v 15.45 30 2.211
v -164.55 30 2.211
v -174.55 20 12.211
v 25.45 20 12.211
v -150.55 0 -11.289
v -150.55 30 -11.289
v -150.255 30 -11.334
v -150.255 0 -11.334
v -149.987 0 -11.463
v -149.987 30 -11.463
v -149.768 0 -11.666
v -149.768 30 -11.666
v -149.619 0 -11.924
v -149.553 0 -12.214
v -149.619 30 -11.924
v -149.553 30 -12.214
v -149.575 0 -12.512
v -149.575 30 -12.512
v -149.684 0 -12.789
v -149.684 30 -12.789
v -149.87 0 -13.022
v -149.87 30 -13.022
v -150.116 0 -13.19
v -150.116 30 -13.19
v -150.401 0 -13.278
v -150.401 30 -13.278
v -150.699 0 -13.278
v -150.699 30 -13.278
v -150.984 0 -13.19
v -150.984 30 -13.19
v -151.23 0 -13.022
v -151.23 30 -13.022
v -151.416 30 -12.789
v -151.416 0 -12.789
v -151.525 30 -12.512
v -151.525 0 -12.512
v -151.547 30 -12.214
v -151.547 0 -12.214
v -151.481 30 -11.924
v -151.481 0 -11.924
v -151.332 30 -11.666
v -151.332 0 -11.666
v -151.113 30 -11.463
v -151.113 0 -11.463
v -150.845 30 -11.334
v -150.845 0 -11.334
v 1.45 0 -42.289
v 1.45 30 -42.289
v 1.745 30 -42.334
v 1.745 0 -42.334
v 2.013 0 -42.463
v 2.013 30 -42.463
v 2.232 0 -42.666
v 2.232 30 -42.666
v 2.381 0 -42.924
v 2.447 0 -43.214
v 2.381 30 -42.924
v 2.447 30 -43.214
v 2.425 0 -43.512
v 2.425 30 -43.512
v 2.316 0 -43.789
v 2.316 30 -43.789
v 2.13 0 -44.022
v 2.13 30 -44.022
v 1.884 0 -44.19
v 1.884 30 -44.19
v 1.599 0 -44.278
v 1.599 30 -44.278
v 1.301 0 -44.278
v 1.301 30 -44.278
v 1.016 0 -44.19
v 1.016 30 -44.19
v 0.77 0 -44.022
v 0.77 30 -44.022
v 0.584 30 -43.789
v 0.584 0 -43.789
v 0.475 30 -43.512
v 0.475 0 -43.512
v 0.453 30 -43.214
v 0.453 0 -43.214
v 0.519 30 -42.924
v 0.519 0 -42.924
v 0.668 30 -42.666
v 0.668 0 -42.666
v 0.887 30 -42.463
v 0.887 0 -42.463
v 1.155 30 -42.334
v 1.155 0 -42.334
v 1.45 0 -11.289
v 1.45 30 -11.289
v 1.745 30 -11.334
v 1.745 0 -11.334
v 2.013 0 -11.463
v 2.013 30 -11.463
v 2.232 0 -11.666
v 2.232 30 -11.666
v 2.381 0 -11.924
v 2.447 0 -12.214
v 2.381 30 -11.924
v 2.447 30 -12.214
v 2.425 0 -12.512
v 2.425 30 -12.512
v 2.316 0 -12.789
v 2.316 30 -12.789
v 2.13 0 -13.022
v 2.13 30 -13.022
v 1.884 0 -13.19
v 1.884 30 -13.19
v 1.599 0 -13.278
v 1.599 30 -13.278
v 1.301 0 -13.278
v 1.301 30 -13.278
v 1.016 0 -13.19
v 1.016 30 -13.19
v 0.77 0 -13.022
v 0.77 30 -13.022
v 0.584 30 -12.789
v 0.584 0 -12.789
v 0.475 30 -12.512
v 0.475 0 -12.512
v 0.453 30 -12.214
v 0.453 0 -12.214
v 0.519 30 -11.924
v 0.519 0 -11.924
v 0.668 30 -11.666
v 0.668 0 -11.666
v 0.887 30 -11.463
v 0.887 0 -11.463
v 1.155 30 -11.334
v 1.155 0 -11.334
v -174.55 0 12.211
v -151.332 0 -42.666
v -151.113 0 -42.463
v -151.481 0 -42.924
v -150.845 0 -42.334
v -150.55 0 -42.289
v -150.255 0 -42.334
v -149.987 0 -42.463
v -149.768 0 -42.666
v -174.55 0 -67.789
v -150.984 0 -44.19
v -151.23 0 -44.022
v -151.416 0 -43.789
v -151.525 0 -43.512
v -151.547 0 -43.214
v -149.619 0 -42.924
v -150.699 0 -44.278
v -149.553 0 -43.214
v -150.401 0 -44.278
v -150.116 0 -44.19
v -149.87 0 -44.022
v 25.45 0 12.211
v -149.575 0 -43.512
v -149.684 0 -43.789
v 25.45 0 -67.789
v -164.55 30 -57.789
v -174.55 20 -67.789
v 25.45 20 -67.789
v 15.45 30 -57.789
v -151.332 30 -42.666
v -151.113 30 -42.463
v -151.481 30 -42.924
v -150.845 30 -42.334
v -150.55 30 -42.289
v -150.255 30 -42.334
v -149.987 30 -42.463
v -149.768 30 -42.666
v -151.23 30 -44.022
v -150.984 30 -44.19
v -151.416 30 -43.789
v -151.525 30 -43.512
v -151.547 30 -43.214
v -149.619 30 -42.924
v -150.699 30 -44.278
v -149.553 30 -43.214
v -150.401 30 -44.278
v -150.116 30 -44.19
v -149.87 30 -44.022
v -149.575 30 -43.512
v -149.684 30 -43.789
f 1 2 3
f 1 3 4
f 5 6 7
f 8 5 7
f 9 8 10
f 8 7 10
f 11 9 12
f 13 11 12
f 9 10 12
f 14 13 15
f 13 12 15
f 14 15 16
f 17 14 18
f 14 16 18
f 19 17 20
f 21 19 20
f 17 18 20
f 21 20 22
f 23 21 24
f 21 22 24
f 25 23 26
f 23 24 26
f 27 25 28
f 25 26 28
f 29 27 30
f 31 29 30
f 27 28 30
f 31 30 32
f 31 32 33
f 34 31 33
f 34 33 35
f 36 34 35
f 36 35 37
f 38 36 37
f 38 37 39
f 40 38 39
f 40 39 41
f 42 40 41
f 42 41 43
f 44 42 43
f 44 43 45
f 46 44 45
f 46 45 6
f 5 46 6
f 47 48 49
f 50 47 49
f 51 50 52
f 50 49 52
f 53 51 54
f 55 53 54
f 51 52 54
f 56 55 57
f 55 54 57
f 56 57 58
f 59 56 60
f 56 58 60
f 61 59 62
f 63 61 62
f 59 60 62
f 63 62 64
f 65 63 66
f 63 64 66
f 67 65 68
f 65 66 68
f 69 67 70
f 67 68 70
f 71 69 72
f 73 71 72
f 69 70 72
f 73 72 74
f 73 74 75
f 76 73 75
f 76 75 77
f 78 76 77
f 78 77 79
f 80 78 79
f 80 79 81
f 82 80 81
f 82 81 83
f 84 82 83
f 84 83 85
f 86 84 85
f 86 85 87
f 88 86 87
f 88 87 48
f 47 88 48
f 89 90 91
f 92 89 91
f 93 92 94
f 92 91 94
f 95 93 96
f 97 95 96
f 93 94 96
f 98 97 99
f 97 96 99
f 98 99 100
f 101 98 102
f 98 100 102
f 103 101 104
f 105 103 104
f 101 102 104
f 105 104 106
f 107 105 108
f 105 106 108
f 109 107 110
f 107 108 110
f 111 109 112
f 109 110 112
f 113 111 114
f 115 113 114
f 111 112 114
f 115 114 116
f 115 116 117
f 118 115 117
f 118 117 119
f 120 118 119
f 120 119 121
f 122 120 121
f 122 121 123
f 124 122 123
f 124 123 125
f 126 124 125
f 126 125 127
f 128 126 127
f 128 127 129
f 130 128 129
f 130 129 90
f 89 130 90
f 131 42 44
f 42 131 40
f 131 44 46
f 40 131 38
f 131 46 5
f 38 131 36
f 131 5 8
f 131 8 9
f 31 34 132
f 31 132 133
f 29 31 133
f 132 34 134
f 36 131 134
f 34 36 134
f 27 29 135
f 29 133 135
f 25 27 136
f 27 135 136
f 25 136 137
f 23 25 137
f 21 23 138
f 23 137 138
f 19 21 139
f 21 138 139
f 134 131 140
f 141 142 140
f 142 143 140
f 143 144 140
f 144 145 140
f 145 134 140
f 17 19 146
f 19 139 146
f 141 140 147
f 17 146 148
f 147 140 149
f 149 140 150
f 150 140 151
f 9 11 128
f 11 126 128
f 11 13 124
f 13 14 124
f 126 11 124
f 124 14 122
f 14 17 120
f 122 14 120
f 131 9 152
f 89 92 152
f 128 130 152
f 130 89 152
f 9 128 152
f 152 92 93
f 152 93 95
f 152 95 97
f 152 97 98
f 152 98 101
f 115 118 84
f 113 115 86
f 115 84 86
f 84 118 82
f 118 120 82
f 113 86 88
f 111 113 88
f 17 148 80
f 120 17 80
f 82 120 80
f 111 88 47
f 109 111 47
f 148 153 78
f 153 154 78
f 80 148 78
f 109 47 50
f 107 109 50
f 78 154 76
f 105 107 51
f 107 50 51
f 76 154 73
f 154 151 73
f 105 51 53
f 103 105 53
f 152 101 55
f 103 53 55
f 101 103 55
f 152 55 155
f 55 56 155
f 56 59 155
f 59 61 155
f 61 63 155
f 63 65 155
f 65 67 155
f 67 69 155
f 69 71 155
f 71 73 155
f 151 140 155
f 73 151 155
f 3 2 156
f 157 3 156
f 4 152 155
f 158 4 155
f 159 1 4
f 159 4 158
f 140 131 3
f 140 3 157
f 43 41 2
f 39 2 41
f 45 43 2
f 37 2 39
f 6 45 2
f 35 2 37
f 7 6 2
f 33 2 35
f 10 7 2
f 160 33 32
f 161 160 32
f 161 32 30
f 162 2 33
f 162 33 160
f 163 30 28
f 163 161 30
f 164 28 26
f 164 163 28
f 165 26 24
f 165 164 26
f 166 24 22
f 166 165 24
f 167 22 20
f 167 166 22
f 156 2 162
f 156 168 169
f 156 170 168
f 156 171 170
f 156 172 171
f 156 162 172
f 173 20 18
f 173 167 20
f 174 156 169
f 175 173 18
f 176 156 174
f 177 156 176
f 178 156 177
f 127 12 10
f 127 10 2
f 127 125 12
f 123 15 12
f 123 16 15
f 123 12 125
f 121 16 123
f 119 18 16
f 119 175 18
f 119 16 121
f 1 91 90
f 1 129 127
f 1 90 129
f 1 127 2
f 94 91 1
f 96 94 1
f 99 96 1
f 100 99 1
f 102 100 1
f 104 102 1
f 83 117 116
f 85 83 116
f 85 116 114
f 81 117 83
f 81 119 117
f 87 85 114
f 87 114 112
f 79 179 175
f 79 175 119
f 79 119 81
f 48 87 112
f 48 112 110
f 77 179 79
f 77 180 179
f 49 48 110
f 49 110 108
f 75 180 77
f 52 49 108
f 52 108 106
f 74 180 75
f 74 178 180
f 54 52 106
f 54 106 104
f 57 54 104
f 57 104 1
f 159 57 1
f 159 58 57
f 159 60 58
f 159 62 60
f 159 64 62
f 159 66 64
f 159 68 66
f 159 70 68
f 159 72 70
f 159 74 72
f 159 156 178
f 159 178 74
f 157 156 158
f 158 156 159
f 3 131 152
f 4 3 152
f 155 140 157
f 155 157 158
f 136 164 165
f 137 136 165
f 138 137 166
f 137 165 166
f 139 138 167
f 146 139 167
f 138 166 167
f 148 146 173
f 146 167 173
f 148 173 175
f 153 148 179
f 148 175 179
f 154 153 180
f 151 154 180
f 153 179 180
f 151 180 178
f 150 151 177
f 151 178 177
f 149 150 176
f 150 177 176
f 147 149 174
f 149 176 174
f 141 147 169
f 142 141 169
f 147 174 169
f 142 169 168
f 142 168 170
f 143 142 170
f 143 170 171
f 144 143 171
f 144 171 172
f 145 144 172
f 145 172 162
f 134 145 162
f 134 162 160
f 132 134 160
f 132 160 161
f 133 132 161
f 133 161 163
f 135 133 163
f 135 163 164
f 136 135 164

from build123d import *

# Parameters (mm, degrees)
SKETCH1_W            = 200
SKETCH1_H            = 80
BOSS_EXTRUDE1_DEPTH  = 30
CHAMFER1_SIZE        = 10
SKETCH2_R            = 1
CUT_EXTRUDE1_DEPTH   = 40
LPATTERN1_COUNT      = 3
LPATTERN1_PITCH      = 152
LPATTERN1_COUNT_DIR2 = 2
LPATTERN1_PITCH_DIR2 = 31


with BuildPart() as part:
    # Sketch1 → Boss-Extrude1 (new body)
    with BuildSketch(Plane(origin=(0, 0, 0), x_dir=(1, 0, 0), z_dir=(0, 1, 0))):
        with Locations((-74.550128535, 27.789203085)):
            Rectangle(SKETCH1_W, SKETCH1_H)
    extrude(amount=BOSS_EXTRUDE1_DEPTH)

    # Chamfer1
    chamfer1_edges = [part.edges().sort_by_distance(p)[0] for p in [
        (-174.550128535, 30, -27.789203085),
        (-74.550128535, 30, 12.210796915),
        (25.449871465, 30, -27.789203085),
        (-74.550128535, 30, -67.789203085),
    ]]
    chamfer(chamfer1_edges, length=CHAMFER1_SIZE)

    # Sketch2 → Cut-Extrude1 (cut)
    with BuildSketch(Plane(origin=(0, 30, 0), x_dir=(1, 0, 0), z_dir=(0, 1, 0))):
        with Locations(Location((1.449871465, 43.289203085, 0), (0, 0, 270))):
            Circle(SKETCH2_R)
    cut_extrude1 = extrude(amount=-CUT_EXTRUDE1_DEPTH, mode=Mode.SUBTRACT)

    # LPattern1: Cut-Extrude1 3 × 2
    with Locations(*[(-i * LPATTERN1_PITCH, 0, j * LPATTERN1_PITCH_DIR2) for i in range(LPATTERN1_COUNT) for j in range(LPATTERN1_COUNT_DIR2) if (i, j) != (0, 0)]):
        add(cut_extrude1, mode=Mode.SUBTRACT)


solid = part.part
